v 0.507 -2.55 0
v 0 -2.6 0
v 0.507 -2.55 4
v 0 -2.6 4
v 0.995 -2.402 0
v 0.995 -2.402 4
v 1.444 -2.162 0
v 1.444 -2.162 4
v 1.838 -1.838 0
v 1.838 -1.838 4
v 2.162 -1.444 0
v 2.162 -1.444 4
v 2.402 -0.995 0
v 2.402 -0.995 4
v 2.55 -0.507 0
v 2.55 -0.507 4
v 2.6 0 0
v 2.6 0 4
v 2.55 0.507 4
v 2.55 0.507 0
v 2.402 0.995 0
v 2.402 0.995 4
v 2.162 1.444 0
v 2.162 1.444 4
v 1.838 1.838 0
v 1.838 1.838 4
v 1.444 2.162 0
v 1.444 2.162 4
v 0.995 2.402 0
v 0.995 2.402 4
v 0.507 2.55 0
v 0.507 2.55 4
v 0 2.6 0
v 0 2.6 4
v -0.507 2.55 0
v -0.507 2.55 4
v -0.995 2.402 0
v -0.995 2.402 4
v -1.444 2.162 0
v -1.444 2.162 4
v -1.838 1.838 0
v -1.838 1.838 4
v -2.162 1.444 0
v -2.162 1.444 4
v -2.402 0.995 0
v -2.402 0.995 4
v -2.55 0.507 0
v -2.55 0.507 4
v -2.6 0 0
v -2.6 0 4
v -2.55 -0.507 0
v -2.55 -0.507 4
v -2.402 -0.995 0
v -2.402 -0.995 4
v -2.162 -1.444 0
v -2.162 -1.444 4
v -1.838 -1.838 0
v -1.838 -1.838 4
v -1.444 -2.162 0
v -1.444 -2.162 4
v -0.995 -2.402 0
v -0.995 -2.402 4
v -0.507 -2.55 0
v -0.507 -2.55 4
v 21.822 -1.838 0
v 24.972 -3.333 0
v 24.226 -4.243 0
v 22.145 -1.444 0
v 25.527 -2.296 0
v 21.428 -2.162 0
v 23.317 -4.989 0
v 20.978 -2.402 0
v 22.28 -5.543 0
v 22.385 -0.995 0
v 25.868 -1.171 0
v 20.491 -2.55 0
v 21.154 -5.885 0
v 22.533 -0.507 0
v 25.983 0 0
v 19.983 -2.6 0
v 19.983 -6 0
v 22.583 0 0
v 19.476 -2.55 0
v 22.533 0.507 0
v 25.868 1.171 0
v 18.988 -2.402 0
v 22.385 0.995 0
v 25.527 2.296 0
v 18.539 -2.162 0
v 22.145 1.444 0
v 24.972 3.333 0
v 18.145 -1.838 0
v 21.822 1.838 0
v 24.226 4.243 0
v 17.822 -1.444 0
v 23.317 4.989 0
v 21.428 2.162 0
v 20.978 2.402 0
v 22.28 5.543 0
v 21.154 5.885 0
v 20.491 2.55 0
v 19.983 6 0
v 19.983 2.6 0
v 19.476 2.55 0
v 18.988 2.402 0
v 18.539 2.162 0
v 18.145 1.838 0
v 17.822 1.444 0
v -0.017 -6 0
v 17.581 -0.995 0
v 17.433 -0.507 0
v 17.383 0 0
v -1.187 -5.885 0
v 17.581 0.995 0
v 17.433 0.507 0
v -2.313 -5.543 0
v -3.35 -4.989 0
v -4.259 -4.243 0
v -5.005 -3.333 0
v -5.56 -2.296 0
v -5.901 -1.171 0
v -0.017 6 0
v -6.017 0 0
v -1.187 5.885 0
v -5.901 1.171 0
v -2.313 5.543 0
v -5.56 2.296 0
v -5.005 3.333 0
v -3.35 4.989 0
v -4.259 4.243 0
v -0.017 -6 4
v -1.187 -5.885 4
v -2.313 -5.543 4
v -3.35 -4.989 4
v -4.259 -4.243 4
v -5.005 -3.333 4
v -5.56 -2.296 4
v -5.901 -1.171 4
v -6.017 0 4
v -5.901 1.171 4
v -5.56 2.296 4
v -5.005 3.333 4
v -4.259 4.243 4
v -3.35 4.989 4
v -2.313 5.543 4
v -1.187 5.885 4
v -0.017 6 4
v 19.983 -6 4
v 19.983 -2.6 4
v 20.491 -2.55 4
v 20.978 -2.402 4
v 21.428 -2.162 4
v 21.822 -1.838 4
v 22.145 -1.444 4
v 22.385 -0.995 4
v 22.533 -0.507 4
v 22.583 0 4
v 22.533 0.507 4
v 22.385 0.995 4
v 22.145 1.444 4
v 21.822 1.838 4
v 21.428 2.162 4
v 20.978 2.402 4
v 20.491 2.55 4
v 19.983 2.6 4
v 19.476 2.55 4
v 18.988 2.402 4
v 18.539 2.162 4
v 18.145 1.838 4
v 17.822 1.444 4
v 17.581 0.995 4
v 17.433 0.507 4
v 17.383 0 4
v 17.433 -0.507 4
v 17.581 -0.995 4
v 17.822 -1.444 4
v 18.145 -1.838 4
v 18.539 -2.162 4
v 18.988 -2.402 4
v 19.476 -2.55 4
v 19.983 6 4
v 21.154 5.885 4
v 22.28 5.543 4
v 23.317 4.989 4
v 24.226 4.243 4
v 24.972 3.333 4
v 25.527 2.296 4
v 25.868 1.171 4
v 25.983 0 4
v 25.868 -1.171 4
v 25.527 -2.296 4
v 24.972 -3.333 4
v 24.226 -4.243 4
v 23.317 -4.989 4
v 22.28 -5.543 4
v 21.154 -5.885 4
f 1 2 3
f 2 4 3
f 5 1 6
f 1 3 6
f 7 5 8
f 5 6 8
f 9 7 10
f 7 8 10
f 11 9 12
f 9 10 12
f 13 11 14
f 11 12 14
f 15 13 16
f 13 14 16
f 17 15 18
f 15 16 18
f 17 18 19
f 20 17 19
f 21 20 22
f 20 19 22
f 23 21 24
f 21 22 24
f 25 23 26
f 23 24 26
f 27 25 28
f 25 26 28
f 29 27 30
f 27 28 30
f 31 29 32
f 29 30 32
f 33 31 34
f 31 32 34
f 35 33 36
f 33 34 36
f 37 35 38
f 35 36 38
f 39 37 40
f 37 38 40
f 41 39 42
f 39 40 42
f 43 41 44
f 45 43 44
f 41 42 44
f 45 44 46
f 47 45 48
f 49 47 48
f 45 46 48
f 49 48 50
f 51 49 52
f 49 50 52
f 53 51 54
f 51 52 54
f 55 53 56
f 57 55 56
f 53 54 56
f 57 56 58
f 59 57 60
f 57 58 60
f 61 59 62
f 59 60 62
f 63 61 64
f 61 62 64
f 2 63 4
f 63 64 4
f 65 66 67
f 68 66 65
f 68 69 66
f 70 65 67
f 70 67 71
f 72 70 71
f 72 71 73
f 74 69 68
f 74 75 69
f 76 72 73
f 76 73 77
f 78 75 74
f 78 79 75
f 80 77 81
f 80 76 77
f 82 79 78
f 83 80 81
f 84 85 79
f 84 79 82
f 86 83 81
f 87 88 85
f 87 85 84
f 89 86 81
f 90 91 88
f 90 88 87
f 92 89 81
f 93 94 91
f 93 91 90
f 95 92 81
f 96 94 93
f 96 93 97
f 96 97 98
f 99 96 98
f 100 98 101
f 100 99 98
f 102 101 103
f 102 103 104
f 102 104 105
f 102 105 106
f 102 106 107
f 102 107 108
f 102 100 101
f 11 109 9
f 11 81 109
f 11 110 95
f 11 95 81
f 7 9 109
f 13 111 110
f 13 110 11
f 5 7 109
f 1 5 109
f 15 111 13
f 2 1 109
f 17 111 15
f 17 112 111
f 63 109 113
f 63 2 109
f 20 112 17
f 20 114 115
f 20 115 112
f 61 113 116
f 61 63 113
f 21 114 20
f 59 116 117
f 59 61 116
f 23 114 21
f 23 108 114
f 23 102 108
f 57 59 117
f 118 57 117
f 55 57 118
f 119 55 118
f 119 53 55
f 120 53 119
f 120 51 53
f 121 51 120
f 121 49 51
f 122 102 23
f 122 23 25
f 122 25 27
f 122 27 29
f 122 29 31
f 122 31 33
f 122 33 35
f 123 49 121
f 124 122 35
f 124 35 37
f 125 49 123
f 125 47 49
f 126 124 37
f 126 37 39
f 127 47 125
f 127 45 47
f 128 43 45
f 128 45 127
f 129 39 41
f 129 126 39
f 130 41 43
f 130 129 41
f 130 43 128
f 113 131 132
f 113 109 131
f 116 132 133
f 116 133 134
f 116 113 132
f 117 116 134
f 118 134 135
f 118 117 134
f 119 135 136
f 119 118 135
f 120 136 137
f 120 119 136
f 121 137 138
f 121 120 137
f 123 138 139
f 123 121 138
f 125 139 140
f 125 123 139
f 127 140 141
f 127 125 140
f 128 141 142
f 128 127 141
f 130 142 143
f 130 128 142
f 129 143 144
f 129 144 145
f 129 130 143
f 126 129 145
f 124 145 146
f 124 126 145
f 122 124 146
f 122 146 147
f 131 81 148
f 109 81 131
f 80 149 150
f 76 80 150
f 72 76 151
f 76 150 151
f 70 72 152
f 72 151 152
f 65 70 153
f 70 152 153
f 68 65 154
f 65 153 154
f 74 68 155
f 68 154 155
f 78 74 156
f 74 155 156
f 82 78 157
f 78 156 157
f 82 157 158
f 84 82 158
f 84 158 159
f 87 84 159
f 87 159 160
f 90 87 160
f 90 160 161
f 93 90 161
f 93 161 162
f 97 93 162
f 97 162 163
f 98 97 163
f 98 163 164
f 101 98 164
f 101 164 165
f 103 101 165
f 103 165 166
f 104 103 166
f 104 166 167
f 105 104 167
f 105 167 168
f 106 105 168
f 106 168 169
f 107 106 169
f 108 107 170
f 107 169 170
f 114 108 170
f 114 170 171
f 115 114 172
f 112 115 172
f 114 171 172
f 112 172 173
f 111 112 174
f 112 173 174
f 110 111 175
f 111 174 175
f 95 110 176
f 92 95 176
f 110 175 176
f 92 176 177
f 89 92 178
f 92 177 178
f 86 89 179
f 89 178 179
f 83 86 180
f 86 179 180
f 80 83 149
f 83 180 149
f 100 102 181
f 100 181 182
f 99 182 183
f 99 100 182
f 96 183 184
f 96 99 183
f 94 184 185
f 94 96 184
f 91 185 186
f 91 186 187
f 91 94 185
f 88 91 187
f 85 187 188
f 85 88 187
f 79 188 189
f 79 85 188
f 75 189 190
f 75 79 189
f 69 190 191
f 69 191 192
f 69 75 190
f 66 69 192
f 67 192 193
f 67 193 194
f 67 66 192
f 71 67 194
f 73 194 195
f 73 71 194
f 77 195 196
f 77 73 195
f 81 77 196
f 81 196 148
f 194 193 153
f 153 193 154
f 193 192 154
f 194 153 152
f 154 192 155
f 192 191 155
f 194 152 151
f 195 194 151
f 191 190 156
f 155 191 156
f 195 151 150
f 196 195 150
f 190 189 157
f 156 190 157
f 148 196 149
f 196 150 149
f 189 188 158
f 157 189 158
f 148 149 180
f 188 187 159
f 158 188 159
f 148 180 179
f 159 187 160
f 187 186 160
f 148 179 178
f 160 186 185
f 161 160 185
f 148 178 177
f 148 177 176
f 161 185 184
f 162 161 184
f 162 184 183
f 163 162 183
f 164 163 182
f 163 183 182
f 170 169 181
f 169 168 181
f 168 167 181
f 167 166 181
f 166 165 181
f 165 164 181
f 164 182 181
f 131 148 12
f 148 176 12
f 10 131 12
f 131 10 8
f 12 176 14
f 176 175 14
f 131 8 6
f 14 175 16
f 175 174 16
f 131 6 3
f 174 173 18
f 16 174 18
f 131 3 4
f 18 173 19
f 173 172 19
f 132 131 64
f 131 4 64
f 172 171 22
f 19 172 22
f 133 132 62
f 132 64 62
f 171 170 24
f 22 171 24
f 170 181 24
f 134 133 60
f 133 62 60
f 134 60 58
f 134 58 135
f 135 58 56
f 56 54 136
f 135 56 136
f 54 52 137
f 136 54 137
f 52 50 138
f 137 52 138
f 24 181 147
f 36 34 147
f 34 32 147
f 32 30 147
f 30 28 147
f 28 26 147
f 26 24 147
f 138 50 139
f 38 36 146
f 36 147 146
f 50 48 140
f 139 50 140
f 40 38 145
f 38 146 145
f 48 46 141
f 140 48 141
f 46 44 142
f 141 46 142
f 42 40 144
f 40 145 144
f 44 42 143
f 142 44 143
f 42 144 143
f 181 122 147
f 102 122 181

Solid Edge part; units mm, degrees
sketch "Sketch1" plane through (0, 0, 0) normal (0, 0, 1) x (1, 0, 0)
  line L0 (-0.0166, 6) -> (19.9834, 6)
  arc A0 (19.9834, 6) -> (19.9834, -6) centre (19.9834, 0) cw
  line L1 (19.9834, -6) -> (-0.0166, -6)
  arc A1 (-0.0166, -6) -> (-0.0166, 6) centre (-0.0166, 0) cw
  dimension "D1" = 6
extrude "Protrusion1" add sketch "Sketch1" along normal blind 4
hole "Hole_1" at (0, 0, 4) direction (0, 0, -1) diameter 5.2 end up to next
hole "Hole1" at (19.9834, 0, 4) direction (0, 0, -1) diameter 5.2 end up to next
properties material "Aluminum, 6061-T6"
